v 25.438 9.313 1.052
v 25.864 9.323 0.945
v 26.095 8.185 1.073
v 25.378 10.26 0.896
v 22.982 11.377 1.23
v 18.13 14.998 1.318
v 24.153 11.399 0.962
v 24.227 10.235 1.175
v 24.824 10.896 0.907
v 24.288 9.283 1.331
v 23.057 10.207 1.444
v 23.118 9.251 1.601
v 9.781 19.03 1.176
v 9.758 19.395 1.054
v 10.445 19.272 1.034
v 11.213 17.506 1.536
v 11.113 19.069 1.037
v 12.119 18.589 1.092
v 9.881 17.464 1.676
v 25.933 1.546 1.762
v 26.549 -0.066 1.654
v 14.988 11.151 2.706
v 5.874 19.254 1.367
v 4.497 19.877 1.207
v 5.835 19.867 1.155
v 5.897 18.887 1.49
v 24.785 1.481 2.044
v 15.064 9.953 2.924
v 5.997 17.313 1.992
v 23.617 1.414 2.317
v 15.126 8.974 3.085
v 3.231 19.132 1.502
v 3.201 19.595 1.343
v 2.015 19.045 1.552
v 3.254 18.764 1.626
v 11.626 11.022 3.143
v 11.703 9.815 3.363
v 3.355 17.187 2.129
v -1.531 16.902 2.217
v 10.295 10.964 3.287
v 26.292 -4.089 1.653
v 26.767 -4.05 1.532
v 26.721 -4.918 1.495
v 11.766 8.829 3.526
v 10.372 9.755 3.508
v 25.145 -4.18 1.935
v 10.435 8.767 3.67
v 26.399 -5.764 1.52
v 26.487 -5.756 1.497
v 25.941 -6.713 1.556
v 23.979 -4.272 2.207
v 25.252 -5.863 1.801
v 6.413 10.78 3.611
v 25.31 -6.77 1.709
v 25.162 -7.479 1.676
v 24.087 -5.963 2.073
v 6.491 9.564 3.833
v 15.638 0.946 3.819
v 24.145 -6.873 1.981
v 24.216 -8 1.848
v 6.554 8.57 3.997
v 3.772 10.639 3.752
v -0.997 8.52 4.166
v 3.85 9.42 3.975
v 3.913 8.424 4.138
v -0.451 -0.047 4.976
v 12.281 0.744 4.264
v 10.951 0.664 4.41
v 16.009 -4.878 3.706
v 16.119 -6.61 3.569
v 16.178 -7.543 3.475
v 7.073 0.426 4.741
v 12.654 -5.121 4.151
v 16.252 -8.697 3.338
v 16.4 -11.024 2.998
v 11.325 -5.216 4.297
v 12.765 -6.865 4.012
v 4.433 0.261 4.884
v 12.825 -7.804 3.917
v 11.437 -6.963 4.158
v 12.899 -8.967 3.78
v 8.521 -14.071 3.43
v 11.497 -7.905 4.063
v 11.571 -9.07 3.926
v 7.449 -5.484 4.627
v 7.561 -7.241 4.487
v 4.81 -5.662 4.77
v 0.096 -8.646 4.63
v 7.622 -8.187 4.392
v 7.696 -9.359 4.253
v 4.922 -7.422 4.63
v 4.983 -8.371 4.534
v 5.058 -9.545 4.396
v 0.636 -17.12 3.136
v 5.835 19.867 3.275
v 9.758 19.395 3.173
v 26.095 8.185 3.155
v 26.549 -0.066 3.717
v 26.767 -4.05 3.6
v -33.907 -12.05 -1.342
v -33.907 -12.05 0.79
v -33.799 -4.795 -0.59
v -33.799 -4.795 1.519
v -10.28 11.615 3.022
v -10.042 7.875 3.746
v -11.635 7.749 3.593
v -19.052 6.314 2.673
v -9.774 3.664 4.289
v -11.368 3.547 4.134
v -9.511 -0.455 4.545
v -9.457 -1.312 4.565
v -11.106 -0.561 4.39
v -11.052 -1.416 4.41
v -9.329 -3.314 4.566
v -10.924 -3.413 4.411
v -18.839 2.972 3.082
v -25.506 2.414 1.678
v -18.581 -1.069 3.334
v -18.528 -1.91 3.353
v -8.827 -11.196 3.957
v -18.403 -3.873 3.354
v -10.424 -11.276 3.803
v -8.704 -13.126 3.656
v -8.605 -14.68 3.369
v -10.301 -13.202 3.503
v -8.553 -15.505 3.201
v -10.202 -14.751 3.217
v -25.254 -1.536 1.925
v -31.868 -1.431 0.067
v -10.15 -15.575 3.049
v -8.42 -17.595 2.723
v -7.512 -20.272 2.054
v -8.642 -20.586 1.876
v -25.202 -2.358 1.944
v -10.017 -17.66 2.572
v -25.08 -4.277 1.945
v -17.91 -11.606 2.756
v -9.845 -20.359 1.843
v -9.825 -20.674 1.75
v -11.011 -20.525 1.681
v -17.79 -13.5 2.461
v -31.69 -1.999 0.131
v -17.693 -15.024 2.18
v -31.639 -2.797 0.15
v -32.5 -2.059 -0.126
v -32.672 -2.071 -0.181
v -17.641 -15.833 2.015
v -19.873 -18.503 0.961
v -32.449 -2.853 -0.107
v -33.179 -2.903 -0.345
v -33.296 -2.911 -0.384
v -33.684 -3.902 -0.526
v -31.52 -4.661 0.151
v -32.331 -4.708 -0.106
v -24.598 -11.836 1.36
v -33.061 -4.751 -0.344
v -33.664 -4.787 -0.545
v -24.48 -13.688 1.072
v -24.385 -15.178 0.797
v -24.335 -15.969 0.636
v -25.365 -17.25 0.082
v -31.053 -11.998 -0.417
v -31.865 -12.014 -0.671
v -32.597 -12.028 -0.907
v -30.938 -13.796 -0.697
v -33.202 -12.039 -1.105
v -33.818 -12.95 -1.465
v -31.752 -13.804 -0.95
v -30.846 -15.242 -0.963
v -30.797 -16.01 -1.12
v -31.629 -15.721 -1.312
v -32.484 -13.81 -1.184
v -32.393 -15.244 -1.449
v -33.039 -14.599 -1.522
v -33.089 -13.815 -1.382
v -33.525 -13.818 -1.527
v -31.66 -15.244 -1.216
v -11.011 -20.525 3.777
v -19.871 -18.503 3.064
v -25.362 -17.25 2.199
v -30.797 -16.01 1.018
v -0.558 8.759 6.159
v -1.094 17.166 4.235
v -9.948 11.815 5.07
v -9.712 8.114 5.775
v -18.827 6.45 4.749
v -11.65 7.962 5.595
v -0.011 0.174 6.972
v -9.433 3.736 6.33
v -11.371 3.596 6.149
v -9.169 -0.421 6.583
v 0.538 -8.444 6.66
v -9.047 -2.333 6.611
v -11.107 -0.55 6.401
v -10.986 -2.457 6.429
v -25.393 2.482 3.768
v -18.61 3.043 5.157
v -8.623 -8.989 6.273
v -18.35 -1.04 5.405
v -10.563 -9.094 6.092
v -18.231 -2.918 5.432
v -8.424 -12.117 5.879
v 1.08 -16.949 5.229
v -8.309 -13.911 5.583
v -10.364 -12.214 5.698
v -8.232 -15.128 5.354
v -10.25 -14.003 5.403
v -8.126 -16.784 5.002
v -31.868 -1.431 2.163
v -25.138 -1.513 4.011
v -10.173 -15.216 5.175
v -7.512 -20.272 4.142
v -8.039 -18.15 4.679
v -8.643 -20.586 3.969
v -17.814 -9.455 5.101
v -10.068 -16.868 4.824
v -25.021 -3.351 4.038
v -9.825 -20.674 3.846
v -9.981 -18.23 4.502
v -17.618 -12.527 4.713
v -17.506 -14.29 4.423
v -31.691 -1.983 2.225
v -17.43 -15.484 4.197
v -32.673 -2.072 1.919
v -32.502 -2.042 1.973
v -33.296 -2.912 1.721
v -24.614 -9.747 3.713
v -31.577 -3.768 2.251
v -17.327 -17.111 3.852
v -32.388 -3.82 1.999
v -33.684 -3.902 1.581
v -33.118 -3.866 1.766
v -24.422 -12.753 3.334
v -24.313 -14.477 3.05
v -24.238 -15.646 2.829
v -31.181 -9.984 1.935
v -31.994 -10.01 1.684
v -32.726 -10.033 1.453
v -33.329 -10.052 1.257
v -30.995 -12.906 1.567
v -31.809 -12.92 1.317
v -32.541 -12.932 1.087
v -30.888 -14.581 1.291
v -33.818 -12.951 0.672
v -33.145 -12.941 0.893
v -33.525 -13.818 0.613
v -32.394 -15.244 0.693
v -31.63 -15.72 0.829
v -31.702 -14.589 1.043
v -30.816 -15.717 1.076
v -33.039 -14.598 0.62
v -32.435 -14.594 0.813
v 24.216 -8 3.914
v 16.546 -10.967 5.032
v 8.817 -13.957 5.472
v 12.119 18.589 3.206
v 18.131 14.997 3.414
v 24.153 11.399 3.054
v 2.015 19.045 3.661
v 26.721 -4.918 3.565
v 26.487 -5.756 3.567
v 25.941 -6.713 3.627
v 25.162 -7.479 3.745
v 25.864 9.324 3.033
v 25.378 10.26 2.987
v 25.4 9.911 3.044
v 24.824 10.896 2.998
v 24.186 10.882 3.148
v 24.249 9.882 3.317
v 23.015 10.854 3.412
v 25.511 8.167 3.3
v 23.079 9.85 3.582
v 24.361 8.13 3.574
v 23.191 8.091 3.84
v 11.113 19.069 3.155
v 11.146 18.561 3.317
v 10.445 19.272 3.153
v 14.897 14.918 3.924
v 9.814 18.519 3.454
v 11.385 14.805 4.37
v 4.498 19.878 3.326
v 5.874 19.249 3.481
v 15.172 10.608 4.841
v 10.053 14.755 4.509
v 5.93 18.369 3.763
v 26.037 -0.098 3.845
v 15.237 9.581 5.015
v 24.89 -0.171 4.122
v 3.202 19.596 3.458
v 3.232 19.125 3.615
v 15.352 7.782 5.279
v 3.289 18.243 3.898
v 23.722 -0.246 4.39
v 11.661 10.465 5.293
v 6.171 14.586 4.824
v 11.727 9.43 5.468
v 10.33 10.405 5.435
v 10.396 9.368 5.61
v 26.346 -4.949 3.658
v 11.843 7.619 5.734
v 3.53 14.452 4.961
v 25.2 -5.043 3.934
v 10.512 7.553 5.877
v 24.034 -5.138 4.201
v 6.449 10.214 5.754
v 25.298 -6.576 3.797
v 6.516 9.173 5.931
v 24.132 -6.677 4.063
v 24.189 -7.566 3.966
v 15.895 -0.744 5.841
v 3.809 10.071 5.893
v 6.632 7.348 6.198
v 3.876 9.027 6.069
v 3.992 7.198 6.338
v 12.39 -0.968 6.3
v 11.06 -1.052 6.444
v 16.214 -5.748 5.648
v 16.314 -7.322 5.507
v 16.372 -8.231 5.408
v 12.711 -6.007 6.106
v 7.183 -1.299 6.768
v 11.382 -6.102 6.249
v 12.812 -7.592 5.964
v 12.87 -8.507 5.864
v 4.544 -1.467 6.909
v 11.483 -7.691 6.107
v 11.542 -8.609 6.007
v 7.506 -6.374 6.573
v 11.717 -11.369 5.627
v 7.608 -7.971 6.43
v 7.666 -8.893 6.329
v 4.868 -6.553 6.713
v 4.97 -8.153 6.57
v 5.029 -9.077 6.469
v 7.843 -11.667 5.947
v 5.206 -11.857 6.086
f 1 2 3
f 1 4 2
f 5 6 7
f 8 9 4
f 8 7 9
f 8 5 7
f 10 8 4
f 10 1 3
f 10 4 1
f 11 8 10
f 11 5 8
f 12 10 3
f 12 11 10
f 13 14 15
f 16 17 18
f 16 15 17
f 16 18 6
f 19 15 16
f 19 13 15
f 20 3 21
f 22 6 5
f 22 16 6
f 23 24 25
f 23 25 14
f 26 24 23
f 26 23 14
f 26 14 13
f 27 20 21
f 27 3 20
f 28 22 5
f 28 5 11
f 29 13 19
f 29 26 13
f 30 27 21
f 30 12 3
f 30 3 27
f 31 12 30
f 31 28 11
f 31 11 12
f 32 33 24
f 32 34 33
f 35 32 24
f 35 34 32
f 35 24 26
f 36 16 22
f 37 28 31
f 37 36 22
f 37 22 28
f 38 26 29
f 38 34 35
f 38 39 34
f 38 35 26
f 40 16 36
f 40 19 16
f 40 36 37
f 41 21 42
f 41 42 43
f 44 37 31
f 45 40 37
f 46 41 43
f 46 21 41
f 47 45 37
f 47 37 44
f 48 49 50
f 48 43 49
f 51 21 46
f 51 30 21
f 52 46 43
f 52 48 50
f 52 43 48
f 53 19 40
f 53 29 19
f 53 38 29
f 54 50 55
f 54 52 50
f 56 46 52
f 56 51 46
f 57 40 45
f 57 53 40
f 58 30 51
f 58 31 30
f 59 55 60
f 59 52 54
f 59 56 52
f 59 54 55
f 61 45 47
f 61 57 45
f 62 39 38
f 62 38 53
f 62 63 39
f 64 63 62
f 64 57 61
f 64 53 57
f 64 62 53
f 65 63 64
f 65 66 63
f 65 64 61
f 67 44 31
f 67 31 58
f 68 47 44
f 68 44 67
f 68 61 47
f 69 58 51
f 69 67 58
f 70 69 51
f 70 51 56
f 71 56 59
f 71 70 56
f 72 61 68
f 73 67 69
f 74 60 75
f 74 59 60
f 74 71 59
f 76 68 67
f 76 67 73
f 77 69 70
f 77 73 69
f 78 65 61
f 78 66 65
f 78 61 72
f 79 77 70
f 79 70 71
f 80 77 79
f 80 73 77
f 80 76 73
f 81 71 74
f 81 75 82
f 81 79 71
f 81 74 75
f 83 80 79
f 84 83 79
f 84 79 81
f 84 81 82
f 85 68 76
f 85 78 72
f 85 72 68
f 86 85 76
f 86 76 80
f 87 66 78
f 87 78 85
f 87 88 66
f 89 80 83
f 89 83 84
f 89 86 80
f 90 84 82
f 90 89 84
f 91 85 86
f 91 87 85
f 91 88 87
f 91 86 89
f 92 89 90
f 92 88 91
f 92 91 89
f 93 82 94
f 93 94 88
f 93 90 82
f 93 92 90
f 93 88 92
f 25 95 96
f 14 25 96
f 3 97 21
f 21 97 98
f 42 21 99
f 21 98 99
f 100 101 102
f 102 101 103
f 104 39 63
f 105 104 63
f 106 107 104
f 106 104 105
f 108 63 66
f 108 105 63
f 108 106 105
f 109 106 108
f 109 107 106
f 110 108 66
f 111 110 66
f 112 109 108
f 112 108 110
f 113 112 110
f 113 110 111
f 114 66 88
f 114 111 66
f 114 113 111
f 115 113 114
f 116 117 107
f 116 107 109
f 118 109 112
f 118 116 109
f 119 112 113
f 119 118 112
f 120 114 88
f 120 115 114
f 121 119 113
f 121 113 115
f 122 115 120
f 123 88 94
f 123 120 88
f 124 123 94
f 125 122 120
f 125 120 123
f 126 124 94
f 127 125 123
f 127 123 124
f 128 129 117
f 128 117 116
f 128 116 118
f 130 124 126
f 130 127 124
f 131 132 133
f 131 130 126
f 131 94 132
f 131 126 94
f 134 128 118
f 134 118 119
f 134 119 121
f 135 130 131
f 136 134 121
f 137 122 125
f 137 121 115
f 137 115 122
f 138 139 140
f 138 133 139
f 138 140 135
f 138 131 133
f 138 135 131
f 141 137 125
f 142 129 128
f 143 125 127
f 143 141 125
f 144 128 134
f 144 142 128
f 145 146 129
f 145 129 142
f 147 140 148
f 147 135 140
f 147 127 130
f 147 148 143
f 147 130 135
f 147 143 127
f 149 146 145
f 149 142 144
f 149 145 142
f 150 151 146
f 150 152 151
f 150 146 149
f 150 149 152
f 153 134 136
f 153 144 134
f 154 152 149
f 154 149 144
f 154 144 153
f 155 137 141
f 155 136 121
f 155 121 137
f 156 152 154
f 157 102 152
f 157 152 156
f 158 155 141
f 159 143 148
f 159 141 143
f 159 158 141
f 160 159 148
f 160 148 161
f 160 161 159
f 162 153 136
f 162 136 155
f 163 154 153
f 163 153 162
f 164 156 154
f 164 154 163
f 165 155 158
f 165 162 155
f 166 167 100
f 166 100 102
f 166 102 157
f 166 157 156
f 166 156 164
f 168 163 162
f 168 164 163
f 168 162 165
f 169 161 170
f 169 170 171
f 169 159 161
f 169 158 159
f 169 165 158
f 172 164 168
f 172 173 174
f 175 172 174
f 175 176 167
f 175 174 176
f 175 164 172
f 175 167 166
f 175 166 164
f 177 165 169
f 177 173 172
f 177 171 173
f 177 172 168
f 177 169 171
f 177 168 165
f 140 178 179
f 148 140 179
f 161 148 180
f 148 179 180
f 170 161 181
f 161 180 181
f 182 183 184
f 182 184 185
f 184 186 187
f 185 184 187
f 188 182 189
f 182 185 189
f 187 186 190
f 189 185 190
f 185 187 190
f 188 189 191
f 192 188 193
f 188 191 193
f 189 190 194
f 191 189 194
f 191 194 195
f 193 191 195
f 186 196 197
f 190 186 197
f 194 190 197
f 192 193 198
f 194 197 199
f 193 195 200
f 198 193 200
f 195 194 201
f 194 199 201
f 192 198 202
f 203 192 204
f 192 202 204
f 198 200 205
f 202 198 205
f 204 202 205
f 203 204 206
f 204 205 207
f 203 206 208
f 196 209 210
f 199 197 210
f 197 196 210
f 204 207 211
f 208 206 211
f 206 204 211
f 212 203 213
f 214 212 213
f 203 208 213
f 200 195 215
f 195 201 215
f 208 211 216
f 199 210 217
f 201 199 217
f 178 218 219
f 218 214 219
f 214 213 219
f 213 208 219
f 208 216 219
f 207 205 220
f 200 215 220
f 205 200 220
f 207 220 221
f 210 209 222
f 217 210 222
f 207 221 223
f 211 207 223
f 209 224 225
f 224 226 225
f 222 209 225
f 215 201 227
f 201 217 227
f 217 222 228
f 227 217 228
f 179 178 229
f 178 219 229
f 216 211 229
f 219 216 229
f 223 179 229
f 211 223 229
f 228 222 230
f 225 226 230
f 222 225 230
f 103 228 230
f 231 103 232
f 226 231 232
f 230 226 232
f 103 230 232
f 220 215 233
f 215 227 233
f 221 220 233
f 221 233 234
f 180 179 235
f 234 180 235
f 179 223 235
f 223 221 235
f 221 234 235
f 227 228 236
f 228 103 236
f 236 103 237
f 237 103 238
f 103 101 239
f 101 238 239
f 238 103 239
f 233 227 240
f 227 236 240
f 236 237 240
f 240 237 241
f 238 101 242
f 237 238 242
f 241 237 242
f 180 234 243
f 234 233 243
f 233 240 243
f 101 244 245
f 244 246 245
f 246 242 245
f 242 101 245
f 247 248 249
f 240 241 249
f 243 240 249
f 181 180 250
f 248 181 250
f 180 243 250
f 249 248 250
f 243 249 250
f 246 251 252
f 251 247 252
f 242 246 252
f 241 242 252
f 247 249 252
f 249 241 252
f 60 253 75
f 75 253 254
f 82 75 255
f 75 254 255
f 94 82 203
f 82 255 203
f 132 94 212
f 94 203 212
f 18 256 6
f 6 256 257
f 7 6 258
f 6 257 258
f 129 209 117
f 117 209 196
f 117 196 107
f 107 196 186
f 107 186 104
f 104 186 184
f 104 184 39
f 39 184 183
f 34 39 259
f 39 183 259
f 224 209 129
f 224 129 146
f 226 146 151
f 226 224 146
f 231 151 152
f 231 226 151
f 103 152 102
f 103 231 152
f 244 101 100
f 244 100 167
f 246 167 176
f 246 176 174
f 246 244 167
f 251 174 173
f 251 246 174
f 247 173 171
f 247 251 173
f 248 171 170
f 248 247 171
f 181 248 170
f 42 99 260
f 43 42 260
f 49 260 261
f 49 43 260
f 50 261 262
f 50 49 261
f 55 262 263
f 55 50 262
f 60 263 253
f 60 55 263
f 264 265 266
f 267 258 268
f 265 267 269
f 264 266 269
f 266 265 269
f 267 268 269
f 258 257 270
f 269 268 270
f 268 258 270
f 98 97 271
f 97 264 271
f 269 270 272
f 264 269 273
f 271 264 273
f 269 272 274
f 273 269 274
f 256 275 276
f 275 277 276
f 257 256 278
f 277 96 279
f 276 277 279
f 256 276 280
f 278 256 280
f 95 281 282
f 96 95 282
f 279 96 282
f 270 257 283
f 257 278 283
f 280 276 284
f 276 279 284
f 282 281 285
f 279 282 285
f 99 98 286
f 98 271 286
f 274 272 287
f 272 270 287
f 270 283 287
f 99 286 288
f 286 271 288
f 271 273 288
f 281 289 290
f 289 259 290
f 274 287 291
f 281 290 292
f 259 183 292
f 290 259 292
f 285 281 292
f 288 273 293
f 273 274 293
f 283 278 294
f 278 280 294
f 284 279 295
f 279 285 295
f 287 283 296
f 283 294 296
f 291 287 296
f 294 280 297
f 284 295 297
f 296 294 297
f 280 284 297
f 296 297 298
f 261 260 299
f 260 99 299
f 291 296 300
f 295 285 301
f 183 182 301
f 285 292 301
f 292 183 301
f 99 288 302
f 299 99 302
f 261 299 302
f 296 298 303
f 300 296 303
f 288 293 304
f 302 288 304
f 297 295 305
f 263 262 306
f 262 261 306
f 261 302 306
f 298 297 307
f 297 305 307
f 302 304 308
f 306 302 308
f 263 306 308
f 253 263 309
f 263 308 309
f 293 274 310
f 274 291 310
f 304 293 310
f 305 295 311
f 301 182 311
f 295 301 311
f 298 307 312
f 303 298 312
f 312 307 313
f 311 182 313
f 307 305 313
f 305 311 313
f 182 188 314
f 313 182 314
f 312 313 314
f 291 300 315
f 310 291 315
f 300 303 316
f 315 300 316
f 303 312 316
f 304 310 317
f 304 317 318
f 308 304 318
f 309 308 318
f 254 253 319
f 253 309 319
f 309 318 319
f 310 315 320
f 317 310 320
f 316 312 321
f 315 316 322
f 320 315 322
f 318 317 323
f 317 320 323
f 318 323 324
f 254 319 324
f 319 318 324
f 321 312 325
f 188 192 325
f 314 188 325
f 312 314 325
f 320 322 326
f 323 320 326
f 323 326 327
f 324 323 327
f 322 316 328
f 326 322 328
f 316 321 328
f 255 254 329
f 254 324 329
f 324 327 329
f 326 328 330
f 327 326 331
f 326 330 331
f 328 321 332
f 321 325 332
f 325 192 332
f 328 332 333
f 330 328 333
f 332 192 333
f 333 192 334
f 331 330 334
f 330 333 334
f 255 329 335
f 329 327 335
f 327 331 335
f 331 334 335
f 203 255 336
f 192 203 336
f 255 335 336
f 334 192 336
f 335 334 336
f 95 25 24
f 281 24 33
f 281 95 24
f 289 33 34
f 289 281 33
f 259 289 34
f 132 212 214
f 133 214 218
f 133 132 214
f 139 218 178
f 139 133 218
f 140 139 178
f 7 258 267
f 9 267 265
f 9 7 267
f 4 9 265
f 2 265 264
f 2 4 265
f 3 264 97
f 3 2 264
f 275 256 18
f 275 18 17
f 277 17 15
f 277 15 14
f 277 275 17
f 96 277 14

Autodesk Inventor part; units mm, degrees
ref_plane "YZ Plane" through (0, 0, 0) normal (1, 0, 0) x (0, 1, 0)
ref_plane "XZ Plane" through (0, 0, 0) normal (0, 1, 0) x (-1, 0, 0)
sketch "Base" plane through (0, 0, 0) normal (0, 0, 1) x (1, 0, 0)
  line L0 (11.024, 19.2429) -> (25.9786, 10.3086)
  line L1 (25.9786, 10.3086) -> (26.9269, -6.9521)
  line L2 (26.9269, -6.9521) -> (-9.2224, -20.9335)
  line L3 (-9.2224, -20.9335) -> (-33.9554, -15.2892)
  line L4 (-33.9554, -15.2892) -> (-33.7656, -2.5777)
  line L5 (-33.7656, -2.5777) -> (3.7833, 20.1134)
  line L6 (3.7833, 20.1134) -> (11.024, 19.2429)
  circle A0 centre (-6.3323, 4.8408) radius 2.5
  circle A1 centre (-11.8617, -1.6151) radius 2.5
  line L7 (-6.3323, 4.8408) -> (-11.8617, -1.6151) construction
  line L8 (2.9132, 5.1838) -> (6.4665, -2.5379) construction
  circle A2 centre (2.9132, 5.1838) radius 2.5
  circle A3 centre (6.4665, -2.5379) radius 2.5
  line L9 (-8.3083, -9.3368) -> (0.1918, -9.3368) construction
  circle A4 centre (0.1918, -9.3368) radius 2.5
  circle A5 centre (-8.3083, -9.3368) radius 2.5
  line L10 (0.6421, 4.1388) -> (4.1954, -3.583)
  line L11 (5.1843, 6.2289) -> (8.7376, -1.4928)
  line L12 (-8.2311, 6.4671) -> (-13.7604, 0.0112)
  line L13 (-4.4336, 3.2146) -> (-9.9629, -3.2413)
  line L14 (-8.3083, -6.8368) -> (0.1918, -6.8368)
  line L15 (-8.3083, -11.8368) -> (0.1918, -11.8368)
  line L16 (-11.8617, -1.6151) -> (-18.4752, -9.3368) construction
  line L17 (-18.4752, -9.3368) -> (-8.3083, -9.3368) construction
  line L18 (-11.8617, -1.6151) -> (-8.3083, -9.3368) construction
  line L19 (-18.4752, -9.3368) -> (4.6899, 1.323) construction
  point P0 (0, 0)
  point P1 (-9.097, 1.6129)
  point P2 (-4.0583, -9.3368)
  dimension "d8" = 146
  dimension "d12" = 108
  dimension "d13" = 124
  dimension "d14" = 156
  dimension "d15" = 142
  dimension "d16" = 122
  dimension "d17" = 59.934
  dimension "d20" = 5
  dimension "d62" = 25.5
extrude "BaseFeature" add sketch "Base" along normal mid plane 14 contours L0 L1 L2 L3 L4 L5 L6 | A0 | A0 L13 A1 L12 | A1 | A2 | A2 L11 A3 L10 | A3 | A4 | A4 L15 A5 L14 | A5
fillet "SmallFilletsFeature" radius 4 4 edges at (-33.7656, -2.5777, 0) (-33.9554, -15.2892, 0) (26.9269, -6.9521, 0) (25.9786, 10.3086, 0)
fillet "LargeFilletsFeature" radius 6 3 edges at (-9.2224, -20.9335, 0) (3.7833, 20.1134, 0) (11.024, 19.2429, 0)
ref_plane "SlopeProfileMiddlePlane" through (-8.6558, -2.3082, 0) normal (0.0635705, -0.9979774, 0) x (0, 0, 1)
ref_plane "SlopeProfilePlane" through (-7.5115, -20.2717, 0) normal (0.0635705, -0.9979774, 0) x (0, 0, 1)
sketch "SlopeProfileIntersect" plane through (-8.6558, -2.3082, 0) normal (0.0635705, -0.9979774, 0) x (0, 0, 1)
  arc A0 (7, -8.785) -> (-59.3577, 91.215) centre (-101.5281, -8.785) ccw
  arc A1 (-59.3577, -108.785) -> (7, -8.785) centre (-101.5281, -8.785) ccw
  line L0 (-59.3577, 91.215) -> (-59.3577, -108.785)
  line L1 (-126.2497, -8.785) -> (46.802, -8.785) construction
  line L2 (7, -12.0068) -> (7, 23.1095) construction
  point P0 (0, -8.785)
  point P1 (-59.3577, -8.785)
  dimension "d72" = 66.3577
  dimension "d84" = 200
revolve "SlopeProfileIntersectFeature" cut sketch "SlopeProfileIntersect" angle 360 about axis through (-99.6863, -8.1067, -59.3577) along (0.9979774, 0.0635705, 0) keep common part
sketch "SlopeProfileSubtract" plane through (-8.6558, -2.3082, 0) normal (0.0635705, -0.9979774, 0) x (0, 0, 1)
  arc A0 (7, -8.785) -> (-59.3577, 91.215) centre (-101.5281, -8.785) ccw construction
  arc A1 (-59.3577, -108.785) -> (7, -8.785) centre (-101.5281, -8.785) ccw construction
  arc A2 (4.999, -8.3317) -> (-59.3577, 89.0408) centre (-101.5281, -8.785) ccw
  arc A3 (-59.3577, -106.6108) -> (4.999, -8.3317) centre (-101.5281, -8.785) ccw
  line L0 (-59.3577, 89.0408) -> (-59.3577, -106.6108)
  line L1 (-126.2497, -8.785) -> (46.802, -8.785) construction
  line L2 (-59.3577, 89.0408) -> (-59.3577, 91.215) construction
  point P0 (0, -8.785)
  point P1 (-59.3577, -8.785)
  dimension "d70" = 2
revolve "SlopeProfileSubtractFeature" cut sketch "SlopeProfileSubtract" angle 360 about axis through (-97.5165, -7.9685, -59.3577) along (0.9979774, 0.0635705, 0)
properties part number "ShadeBasicLeft"
